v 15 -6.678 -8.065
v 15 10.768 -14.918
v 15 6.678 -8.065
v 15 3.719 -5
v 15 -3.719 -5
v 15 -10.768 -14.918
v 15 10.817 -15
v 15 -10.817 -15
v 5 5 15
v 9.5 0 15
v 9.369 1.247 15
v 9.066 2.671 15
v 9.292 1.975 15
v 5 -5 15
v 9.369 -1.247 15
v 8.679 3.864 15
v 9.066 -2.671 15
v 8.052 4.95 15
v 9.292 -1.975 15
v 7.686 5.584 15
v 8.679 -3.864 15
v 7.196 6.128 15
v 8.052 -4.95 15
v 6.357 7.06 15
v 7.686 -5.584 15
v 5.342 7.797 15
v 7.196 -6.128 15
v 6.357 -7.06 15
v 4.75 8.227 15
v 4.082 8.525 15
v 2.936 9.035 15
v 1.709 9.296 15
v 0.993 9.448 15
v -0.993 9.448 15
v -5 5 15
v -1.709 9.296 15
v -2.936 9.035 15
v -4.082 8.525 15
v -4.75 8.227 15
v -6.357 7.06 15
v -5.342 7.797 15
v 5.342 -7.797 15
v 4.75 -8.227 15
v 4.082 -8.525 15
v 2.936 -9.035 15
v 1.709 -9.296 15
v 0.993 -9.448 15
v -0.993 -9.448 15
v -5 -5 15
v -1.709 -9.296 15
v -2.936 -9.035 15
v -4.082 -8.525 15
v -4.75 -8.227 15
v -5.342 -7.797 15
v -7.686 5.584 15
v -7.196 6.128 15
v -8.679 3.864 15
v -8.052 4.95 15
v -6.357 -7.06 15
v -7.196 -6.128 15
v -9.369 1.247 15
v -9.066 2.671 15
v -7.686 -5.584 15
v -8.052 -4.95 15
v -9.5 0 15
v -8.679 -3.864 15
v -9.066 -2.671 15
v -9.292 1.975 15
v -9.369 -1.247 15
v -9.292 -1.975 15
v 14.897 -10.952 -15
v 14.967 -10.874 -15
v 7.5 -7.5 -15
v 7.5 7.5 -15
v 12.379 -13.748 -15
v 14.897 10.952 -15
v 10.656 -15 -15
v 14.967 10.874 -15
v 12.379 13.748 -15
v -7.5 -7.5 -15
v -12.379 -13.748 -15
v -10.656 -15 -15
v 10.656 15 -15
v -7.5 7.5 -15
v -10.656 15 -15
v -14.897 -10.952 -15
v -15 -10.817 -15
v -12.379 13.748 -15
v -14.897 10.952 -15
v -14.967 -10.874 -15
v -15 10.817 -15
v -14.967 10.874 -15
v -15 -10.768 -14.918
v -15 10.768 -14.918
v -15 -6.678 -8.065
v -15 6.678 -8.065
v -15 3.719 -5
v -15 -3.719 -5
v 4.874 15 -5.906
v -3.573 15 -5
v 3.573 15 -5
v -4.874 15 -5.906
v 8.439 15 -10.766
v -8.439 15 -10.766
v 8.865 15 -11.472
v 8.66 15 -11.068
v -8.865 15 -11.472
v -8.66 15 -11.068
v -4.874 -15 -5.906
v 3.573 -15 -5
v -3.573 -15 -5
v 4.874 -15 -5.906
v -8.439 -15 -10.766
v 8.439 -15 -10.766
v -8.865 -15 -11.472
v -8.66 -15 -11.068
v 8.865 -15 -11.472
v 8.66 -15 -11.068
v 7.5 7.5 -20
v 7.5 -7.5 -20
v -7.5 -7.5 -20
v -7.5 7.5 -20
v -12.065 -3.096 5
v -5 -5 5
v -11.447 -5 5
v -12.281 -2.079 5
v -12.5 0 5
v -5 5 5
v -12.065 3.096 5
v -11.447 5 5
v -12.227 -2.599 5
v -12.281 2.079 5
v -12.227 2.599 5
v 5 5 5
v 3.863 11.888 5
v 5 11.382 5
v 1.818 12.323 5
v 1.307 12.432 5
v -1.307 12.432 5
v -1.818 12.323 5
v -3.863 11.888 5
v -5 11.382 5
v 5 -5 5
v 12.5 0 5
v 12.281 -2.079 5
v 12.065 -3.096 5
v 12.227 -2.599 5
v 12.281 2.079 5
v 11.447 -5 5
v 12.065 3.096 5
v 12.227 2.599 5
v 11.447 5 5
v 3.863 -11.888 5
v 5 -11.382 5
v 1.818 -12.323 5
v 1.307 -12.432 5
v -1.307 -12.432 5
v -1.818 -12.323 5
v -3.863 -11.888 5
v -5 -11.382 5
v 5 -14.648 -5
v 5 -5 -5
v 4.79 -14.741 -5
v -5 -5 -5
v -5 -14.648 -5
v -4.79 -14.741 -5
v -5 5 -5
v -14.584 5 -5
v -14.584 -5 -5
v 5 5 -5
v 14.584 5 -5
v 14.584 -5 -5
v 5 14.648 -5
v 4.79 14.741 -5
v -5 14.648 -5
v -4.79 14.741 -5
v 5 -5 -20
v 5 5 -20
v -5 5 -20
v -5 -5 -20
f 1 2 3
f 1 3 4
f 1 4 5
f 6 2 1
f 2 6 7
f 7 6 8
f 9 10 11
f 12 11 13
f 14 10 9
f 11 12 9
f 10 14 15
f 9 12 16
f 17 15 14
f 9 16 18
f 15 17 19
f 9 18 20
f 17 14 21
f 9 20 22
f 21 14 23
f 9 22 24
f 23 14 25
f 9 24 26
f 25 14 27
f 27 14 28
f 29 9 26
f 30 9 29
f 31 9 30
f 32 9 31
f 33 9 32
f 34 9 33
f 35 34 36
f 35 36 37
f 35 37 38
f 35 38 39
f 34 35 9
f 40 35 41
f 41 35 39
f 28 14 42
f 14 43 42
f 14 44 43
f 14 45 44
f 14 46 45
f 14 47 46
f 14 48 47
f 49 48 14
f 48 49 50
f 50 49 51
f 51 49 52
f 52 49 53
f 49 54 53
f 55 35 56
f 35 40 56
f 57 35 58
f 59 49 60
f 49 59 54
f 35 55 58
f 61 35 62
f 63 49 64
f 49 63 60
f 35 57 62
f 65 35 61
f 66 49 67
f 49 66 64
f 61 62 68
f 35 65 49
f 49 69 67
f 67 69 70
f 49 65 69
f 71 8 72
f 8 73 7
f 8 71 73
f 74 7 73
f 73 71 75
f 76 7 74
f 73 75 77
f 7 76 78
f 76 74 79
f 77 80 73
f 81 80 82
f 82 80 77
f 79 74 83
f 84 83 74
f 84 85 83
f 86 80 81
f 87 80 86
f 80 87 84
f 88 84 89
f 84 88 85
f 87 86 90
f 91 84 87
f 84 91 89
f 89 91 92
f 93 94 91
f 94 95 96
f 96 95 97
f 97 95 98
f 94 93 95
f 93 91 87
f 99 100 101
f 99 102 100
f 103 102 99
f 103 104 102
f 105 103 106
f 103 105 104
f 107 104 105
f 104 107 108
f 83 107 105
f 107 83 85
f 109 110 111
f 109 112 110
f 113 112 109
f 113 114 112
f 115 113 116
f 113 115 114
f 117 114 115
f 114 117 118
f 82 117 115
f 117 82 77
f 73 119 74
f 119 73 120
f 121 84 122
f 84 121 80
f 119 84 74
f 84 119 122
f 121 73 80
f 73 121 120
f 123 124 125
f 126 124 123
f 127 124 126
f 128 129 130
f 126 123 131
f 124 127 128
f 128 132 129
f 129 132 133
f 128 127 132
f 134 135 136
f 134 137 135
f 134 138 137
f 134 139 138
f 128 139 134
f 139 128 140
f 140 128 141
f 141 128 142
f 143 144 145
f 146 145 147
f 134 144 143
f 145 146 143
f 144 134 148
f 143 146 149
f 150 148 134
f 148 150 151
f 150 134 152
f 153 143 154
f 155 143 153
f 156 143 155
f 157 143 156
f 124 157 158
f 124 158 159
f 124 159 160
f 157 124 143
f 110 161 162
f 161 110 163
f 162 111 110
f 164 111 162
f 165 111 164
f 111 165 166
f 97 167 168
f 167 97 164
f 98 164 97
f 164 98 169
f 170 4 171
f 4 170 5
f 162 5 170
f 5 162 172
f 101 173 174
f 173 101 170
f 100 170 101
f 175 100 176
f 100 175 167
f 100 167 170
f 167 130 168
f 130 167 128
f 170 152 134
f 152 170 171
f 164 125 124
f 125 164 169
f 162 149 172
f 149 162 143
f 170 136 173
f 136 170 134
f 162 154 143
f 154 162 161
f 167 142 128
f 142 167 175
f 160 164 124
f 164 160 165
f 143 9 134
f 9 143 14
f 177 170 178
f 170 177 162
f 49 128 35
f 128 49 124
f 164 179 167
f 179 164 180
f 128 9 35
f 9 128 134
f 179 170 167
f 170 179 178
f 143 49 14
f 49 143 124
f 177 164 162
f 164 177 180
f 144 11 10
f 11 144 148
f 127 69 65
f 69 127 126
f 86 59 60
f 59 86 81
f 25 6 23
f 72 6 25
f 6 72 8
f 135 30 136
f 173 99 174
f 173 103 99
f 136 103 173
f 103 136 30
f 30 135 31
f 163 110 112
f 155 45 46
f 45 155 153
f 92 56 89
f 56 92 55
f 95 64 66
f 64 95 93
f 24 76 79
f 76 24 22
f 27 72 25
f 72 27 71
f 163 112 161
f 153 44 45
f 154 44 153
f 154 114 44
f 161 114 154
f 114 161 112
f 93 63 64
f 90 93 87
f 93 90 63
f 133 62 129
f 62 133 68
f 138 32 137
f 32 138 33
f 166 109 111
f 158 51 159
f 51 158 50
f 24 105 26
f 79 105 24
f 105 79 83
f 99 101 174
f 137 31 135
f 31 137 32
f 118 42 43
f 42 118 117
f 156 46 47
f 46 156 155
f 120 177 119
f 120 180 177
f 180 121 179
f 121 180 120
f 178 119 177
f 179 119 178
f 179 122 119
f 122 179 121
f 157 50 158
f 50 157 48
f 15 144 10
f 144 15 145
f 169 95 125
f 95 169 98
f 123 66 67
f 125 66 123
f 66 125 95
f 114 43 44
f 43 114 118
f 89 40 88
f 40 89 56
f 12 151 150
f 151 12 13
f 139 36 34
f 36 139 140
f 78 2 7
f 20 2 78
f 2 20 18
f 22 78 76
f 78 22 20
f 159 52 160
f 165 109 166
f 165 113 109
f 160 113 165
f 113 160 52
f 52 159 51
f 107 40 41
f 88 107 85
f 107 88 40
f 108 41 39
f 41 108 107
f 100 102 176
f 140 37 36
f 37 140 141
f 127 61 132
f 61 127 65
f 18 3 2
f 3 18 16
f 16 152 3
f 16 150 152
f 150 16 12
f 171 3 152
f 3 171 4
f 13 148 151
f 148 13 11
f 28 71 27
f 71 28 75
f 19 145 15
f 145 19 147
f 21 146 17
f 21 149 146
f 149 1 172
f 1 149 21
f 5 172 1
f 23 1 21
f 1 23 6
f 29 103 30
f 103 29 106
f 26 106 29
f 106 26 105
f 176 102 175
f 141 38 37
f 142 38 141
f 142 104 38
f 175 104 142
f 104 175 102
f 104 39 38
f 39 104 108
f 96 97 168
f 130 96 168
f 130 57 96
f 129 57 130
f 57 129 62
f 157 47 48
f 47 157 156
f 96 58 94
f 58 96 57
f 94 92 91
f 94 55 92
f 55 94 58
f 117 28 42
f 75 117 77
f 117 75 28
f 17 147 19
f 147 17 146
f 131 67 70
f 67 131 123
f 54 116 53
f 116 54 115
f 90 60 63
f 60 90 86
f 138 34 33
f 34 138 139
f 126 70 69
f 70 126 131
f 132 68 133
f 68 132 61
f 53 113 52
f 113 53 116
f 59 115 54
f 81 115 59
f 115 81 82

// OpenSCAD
intersection(){difference(){union(){translate(v = [-15.000, -15.000, -15.000])
cube(size = [30, 30, 30]);
translate(v = [0, 0, -25])
translate(v = [-7.500, -7.500, -25.000])
cube(size = [15, 15, 50]);
}
union(){translate(v = [-25.000, -5.000, -5.000])
cube(size = [50, 10, 10]);
translate(v = [-5.000, -25.000, -5.000])
cube(size = [10, 50, 10]);
translate(v = [-5.000, -5.000, -25.000])
cube(size = [10, 10, 50]);
}
}
translate(v = [0, 0, 5])
cylinder(r1 = 20, r2 = 5, h = 50, center = true);
}
